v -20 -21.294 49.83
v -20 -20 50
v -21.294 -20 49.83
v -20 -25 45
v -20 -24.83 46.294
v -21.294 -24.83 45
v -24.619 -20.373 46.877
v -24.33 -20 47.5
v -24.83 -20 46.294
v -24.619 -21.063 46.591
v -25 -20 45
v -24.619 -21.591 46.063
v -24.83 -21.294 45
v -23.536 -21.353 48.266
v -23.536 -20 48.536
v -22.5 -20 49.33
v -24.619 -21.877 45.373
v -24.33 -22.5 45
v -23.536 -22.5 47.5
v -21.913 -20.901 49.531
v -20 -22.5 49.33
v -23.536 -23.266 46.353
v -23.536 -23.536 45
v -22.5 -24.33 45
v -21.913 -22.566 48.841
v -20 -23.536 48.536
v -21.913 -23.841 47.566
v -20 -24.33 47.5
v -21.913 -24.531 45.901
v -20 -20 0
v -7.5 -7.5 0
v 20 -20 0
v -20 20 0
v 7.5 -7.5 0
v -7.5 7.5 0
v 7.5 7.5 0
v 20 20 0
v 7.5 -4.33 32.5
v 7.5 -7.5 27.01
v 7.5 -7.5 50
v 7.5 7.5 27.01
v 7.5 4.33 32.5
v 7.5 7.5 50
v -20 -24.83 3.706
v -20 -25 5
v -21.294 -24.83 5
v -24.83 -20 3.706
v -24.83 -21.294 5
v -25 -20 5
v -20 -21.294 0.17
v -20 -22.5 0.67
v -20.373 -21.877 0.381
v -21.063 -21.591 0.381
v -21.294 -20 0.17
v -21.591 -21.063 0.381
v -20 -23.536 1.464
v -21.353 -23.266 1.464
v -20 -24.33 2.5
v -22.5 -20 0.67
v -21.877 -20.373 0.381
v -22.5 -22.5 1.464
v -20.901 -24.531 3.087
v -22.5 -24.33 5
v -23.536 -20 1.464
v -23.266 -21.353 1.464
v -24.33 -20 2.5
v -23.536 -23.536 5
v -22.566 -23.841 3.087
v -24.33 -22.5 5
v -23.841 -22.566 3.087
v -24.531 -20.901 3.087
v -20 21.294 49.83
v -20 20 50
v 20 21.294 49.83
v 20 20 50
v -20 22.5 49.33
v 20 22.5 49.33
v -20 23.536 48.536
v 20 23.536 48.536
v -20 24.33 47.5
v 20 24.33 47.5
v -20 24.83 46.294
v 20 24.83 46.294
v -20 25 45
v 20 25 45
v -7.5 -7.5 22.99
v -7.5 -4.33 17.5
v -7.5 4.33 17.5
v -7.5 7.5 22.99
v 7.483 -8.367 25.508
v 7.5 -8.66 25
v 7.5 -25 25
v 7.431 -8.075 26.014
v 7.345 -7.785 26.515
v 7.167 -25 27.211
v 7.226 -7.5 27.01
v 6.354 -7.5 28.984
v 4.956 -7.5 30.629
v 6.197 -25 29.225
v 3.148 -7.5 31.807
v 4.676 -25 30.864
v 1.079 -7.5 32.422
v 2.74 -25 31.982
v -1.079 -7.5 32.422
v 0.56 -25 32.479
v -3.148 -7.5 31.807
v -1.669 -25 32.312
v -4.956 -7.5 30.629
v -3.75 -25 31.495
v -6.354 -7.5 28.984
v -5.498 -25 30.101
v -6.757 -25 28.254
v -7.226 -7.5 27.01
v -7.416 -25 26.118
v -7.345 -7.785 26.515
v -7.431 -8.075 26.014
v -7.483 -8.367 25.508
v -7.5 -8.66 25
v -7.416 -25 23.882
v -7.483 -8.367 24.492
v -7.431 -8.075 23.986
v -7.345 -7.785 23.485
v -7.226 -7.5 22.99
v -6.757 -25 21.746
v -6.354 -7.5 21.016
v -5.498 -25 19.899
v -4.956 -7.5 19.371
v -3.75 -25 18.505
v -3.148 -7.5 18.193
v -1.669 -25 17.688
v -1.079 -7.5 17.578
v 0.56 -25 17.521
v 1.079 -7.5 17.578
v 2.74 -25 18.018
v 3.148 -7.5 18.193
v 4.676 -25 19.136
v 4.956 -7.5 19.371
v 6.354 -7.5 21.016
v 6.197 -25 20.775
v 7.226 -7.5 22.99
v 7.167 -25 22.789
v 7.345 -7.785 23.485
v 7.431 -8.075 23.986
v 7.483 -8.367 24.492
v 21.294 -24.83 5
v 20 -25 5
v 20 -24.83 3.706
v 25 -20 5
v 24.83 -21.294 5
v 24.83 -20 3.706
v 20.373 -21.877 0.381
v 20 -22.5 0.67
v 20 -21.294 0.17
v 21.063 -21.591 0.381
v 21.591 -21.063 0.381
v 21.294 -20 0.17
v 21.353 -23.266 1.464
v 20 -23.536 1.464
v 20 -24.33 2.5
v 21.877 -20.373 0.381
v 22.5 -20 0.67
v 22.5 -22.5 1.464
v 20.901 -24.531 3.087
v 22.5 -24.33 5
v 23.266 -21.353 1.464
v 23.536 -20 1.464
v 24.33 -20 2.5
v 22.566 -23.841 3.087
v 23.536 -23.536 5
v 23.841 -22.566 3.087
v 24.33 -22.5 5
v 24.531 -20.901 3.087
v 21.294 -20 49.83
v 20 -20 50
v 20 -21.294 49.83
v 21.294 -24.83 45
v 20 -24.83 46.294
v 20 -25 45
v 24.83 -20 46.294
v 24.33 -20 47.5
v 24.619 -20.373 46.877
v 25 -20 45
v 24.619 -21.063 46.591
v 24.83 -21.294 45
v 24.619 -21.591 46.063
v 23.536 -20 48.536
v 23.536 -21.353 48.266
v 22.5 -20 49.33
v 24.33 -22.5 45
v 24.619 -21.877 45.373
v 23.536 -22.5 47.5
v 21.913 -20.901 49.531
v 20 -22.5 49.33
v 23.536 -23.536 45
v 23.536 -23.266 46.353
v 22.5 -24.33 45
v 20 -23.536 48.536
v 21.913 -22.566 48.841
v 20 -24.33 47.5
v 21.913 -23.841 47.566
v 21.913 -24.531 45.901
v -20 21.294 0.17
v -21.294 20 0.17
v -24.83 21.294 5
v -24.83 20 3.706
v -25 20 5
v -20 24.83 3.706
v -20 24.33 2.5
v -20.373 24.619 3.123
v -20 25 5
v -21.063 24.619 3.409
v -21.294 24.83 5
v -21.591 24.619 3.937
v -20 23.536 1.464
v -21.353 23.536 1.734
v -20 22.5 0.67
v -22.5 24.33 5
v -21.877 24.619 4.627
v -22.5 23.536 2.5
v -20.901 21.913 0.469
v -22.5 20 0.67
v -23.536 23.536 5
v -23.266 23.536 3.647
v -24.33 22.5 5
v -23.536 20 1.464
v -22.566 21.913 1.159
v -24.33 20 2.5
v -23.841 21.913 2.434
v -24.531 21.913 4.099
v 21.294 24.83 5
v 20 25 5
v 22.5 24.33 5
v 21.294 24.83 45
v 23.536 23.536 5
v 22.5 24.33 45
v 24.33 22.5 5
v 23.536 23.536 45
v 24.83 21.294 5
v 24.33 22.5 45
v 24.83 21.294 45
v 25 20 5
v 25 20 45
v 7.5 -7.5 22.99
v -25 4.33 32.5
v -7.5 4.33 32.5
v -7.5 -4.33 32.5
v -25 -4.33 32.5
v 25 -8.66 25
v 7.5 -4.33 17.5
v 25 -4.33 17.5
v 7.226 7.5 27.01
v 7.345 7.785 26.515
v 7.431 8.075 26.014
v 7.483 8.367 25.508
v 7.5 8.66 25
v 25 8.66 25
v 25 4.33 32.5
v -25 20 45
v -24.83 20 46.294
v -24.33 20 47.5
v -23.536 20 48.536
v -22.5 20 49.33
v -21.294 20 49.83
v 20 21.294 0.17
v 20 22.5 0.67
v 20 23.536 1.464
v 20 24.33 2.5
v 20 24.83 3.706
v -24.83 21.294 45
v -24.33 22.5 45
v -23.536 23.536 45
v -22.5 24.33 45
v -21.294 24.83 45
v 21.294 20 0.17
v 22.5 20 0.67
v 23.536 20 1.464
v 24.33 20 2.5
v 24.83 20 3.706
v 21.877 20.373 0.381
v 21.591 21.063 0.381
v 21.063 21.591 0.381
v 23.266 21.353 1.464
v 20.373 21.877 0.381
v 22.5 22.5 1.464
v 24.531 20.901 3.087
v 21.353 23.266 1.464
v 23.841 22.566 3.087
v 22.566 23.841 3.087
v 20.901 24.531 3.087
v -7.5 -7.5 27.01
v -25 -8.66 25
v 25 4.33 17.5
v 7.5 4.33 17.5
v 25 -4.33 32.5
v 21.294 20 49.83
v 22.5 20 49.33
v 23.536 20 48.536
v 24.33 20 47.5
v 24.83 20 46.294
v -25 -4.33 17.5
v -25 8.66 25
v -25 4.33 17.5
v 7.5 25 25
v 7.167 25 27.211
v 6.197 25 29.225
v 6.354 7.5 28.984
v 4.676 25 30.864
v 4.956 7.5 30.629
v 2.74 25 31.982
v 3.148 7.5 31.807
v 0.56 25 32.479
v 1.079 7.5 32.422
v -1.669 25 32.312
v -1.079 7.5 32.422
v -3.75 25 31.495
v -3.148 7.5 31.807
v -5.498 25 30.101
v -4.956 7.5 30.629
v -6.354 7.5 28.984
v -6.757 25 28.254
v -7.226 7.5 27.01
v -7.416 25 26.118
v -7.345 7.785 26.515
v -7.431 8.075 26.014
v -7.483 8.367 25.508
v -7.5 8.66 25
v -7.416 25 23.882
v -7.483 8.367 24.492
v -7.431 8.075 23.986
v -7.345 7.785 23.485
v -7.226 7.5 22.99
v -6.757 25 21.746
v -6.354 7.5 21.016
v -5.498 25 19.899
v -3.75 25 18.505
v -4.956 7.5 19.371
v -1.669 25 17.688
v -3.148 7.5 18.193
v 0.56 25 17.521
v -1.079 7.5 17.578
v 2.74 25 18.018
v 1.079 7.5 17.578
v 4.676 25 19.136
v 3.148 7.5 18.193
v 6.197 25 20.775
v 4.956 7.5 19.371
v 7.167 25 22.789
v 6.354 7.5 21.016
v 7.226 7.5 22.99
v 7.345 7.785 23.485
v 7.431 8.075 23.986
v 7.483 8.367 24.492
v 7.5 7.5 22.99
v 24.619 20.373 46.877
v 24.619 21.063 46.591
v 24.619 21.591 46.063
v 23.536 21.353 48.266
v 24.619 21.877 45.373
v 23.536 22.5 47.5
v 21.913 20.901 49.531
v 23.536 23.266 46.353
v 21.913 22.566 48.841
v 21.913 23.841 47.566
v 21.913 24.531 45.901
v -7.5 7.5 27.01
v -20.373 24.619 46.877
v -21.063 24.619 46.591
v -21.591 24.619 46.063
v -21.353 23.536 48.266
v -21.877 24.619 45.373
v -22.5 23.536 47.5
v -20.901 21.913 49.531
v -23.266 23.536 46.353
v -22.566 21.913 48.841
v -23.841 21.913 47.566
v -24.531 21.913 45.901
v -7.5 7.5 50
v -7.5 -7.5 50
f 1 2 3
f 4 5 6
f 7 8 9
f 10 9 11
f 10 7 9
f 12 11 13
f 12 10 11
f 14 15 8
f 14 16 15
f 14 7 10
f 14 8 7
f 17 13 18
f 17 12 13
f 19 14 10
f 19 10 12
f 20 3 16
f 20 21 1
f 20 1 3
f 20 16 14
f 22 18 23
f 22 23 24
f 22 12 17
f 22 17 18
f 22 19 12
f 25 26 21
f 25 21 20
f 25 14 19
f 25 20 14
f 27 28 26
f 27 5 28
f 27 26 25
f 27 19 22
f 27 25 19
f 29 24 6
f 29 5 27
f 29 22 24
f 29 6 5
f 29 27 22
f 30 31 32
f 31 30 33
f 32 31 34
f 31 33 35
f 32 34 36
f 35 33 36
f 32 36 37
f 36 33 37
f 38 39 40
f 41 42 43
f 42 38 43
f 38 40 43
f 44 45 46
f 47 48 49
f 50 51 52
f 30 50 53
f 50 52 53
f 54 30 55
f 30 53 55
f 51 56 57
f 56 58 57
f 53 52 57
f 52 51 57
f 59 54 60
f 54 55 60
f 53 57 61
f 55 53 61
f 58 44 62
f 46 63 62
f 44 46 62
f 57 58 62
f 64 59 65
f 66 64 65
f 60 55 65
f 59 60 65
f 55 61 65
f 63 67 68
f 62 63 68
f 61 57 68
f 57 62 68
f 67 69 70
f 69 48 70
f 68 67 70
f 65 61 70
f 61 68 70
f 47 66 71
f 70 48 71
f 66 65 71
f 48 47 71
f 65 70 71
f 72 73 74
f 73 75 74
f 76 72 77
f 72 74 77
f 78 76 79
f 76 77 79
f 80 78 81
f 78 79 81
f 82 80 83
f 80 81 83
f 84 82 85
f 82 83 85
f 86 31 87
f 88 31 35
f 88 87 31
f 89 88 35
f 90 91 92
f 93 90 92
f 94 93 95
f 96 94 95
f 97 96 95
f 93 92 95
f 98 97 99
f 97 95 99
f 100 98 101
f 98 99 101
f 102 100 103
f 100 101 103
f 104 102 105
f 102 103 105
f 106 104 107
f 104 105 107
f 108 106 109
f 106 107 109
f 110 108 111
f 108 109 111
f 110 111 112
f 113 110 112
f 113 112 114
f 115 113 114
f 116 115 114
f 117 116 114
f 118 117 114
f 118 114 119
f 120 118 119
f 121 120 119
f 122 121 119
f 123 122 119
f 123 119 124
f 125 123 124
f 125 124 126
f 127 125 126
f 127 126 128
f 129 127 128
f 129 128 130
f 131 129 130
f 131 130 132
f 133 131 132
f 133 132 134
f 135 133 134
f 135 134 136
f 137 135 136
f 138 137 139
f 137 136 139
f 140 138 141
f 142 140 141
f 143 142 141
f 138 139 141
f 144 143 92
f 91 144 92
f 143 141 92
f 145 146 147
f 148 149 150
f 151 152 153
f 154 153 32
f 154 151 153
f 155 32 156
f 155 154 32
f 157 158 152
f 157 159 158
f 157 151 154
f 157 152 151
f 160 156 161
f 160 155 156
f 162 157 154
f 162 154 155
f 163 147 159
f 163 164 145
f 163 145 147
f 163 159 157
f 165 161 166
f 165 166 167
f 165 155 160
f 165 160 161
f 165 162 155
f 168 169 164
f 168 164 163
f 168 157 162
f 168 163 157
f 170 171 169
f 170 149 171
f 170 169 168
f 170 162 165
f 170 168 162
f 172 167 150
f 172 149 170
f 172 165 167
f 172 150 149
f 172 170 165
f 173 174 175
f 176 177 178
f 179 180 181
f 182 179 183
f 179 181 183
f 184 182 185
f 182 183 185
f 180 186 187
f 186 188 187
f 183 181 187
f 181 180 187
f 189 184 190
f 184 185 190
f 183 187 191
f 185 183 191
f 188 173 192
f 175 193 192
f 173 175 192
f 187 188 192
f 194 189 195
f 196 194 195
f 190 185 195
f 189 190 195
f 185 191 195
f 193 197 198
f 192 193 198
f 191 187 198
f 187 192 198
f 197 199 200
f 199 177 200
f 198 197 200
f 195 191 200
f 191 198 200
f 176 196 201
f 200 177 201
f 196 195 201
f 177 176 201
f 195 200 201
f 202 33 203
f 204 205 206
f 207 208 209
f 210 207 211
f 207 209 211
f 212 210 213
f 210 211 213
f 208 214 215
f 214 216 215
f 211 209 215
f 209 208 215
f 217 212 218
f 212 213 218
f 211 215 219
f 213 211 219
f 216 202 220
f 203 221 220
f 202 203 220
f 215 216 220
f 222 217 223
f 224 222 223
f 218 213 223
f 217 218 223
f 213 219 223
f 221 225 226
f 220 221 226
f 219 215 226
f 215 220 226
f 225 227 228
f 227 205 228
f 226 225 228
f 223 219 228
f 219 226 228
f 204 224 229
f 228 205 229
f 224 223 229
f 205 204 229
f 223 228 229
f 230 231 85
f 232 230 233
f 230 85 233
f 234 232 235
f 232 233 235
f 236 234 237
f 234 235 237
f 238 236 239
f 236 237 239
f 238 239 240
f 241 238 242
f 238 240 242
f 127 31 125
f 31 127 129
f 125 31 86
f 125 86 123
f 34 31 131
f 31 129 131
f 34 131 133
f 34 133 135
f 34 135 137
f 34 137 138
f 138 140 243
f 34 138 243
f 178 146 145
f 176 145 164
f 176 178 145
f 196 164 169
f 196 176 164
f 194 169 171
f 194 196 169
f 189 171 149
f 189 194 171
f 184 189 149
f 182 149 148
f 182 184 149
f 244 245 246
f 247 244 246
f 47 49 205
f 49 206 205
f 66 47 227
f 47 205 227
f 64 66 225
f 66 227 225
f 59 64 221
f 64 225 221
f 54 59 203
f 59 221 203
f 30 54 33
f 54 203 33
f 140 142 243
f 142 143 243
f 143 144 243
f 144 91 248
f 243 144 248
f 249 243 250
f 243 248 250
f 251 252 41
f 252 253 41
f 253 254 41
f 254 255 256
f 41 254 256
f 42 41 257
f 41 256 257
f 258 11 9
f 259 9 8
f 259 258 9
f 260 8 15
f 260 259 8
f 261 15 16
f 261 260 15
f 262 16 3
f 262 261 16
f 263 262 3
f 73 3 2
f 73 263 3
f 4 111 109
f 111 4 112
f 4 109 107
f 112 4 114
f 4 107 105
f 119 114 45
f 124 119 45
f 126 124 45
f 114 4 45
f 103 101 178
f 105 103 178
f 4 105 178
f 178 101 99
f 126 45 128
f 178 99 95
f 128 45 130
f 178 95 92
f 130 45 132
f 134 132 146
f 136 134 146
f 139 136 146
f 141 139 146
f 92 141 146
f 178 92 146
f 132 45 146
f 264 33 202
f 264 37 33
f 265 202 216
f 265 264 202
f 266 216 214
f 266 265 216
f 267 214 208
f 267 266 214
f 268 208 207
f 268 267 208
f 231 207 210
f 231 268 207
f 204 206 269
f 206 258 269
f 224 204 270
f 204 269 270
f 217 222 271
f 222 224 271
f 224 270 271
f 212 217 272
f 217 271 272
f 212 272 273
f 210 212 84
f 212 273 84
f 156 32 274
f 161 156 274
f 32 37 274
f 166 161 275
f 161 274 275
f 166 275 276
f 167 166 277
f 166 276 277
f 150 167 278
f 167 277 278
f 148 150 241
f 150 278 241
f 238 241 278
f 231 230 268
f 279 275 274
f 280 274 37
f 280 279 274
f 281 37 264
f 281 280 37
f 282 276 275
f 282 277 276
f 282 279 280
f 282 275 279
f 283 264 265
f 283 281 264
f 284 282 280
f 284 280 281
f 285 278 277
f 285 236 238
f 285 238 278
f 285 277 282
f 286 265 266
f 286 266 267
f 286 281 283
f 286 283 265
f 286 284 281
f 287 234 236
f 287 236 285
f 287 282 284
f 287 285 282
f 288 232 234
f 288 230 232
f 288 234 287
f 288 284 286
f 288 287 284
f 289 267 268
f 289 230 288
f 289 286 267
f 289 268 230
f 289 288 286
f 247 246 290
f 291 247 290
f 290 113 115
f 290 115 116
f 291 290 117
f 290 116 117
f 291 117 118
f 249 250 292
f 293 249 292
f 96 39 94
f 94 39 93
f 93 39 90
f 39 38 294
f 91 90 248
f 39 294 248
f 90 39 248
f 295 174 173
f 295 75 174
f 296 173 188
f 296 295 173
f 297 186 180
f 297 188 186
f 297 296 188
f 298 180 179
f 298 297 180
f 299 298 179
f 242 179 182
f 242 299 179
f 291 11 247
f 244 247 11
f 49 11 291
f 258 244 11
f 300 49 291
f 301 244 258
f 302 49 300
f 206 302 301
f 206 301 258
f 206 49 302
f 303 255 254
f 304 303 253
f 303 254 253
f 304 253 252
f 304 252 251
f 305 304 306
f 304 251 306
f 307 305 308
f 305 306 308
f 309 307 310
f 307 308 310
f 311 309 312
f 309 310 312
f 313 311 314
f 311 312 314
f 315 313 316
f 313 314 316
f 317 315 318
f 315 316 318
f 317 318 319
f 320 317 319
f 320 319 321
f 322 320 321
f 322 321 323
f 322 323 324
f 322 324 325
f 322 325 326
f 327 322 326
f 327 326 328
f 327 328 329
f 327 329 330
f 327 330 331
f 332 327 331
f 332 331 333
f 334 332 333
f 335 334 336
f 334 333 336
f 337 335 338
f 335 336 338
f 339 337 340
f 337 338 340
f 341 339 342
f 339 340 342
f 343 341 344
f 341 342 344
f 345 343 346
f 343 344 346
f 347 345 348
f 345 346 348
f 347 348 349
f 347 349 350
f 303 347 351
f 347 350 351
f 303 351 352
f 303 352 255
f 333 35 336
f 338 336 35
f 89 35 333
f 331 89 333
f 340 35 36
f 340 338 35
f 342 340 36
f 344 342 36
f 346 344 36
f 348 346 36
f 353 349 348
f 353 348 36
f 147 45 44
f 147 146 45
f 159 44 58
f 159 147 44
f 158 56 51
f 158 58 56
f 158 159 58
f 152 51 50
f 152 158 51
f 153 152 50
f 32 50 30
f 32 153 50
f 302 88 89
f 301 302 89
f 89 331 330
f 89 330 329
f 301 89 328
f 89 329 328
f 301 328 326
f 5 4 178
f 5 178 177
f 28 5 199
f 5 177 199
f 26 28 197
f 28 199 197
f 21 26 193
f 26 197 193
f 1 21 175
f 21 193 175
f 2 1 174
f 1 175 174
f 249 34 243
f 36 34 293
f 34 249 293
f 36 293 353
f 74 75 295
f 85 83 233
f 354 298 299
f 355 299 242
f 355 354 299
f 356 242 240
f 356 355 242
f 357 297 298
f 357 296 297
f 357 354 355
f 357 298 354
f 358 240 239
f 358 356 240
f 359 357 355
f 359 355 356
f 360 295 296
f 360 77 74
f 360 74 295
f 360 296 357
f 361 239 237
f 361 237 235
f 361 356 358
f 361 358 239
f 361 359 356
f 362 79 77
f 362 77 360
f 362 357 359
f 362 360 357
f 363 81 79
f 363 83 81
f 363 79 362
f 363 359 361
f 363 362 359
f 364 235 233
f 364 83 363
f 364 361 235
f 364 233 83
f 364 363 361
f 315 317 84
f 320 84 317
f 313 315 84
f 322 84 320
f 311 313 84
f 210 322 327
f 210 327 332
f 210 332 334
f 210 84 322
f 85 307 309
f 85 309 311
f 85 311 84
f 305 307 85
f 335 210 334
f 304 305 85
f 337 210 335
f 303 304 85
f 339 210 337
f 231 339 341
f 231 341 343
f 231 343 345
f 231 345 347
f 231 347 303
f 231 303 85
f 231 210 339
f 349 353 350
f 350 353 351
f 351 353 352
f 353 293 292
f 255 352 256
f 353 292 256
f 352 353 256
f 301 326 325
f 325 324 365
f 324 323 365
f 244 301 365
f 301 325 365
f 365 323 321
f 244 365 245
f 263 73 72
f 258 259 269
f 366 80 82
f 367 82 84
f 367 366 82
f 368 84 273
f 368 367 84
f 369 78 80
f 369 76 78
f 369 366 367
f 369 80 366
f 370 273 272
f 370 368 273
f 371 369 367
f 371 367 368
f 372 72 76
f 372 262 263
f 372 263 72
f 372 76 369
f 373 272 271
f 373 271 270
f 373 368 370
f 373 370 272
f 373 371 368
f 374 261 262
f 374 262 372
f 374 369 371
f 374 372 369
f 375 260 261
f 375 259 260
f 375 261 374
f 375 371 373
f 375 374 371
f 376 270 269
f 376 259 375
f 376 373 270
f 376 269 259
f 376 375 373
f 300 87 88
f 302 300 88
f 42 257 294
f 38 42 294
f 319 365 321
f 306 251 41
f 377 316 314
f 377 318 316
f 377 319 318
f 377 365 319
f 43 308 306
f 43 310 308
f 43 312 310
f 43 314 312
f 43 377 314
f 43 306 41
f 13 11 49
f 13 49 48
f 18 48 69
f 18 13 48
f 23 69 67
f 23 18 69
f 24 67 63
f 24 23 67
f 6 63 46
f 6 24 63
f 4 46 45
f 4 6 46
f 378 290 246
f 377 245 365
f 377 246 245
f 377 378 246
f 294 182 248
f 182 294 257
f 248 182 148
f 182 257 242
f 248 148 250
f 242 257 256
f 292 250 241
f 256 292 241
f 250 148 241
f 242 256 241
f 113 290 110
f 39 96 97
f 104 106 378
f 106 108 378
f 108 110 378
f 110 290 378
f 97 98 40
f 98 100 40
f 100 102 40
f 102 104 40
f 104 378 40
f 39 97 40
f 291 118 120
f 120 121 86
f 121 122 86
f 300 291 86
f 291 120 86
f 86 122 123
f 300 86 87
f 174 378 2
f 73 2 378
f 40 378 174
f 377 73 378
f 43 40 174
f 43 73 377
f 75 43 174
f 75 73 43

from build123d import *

# Parameters (mm, degrees)
SKETCH_W        = 50
SKETCH_H        = 50
PAD_DEPTH       = 50
SKETCH001_R     = 7.5
HOLE_DEPTH      = 50.001
SKETCH002_W     = 15
SKETCH002_H     = 15
POCKET_DEPTH    = 50.001
POCKET001_DEPTH = 50.001
FILLET_R        = 5


with BuildPart() as part:
    # Sketch → Pad (new body)
    with BuildSketch(Plane.XY):
        Rectangle(SKETCH_W, SKETCH_H)
    extrude(amount=PAD_DEPTH)

    # Sketch001 (on Face3 of Pad) → Hole (cut, through all)
    with BuildSketch(Plane.XZ.offset(25)):
        with Locations((0, 25)):
            Circle(SKETCH001_R)
    extrude(amount=-HOLE_DEPTH, mode=Mode.SUBTRACT)

    # Sketch002 (on Face4 of Hole) → Pocket (cut, through all)
    with BuildSketch(Plane.XY.offset(50)):
        Rectangle(SKETCH002_W, SKETCH002_H)
    extrude(amount=-POCKET_DEPTH, mode=Mode.SUBTRACT)

    # Sketch003 (on Face5 of Pocket) → Pocket001 (cut, through all)
    with BuildSketch(Plane.YZ.offset(25)):
        Polygon((4.330127, 17.5), (8.660254, 25), (4.330127, 32.5), (-4.330127, 32.5), (-8.660254, 25), (-4.330127, 17.5), align=None)
    extrude(amount=-POCKET001_DEPTH, mode=Mode.SUBTRACT)

    # Fillet
    fillet_edges = [part.edges().sort_by_distance(p)[0] for p in [
        (0, -25, 50),
        (-25, 0, 50),
        (0, 25, 50),
        (25, 0, 50),
        (25, 25, 25),
        (25, -25, 25),
        (-25, -25, 25),
        (0, -25, 0),
        (25, 0, 0),
        (-25, 0, 0),
        (0, 25, 0),
        (-25, 25, 25),
    ]]
    fillet(fillet_edges, radius=FILLET_R)


solid = part.part
